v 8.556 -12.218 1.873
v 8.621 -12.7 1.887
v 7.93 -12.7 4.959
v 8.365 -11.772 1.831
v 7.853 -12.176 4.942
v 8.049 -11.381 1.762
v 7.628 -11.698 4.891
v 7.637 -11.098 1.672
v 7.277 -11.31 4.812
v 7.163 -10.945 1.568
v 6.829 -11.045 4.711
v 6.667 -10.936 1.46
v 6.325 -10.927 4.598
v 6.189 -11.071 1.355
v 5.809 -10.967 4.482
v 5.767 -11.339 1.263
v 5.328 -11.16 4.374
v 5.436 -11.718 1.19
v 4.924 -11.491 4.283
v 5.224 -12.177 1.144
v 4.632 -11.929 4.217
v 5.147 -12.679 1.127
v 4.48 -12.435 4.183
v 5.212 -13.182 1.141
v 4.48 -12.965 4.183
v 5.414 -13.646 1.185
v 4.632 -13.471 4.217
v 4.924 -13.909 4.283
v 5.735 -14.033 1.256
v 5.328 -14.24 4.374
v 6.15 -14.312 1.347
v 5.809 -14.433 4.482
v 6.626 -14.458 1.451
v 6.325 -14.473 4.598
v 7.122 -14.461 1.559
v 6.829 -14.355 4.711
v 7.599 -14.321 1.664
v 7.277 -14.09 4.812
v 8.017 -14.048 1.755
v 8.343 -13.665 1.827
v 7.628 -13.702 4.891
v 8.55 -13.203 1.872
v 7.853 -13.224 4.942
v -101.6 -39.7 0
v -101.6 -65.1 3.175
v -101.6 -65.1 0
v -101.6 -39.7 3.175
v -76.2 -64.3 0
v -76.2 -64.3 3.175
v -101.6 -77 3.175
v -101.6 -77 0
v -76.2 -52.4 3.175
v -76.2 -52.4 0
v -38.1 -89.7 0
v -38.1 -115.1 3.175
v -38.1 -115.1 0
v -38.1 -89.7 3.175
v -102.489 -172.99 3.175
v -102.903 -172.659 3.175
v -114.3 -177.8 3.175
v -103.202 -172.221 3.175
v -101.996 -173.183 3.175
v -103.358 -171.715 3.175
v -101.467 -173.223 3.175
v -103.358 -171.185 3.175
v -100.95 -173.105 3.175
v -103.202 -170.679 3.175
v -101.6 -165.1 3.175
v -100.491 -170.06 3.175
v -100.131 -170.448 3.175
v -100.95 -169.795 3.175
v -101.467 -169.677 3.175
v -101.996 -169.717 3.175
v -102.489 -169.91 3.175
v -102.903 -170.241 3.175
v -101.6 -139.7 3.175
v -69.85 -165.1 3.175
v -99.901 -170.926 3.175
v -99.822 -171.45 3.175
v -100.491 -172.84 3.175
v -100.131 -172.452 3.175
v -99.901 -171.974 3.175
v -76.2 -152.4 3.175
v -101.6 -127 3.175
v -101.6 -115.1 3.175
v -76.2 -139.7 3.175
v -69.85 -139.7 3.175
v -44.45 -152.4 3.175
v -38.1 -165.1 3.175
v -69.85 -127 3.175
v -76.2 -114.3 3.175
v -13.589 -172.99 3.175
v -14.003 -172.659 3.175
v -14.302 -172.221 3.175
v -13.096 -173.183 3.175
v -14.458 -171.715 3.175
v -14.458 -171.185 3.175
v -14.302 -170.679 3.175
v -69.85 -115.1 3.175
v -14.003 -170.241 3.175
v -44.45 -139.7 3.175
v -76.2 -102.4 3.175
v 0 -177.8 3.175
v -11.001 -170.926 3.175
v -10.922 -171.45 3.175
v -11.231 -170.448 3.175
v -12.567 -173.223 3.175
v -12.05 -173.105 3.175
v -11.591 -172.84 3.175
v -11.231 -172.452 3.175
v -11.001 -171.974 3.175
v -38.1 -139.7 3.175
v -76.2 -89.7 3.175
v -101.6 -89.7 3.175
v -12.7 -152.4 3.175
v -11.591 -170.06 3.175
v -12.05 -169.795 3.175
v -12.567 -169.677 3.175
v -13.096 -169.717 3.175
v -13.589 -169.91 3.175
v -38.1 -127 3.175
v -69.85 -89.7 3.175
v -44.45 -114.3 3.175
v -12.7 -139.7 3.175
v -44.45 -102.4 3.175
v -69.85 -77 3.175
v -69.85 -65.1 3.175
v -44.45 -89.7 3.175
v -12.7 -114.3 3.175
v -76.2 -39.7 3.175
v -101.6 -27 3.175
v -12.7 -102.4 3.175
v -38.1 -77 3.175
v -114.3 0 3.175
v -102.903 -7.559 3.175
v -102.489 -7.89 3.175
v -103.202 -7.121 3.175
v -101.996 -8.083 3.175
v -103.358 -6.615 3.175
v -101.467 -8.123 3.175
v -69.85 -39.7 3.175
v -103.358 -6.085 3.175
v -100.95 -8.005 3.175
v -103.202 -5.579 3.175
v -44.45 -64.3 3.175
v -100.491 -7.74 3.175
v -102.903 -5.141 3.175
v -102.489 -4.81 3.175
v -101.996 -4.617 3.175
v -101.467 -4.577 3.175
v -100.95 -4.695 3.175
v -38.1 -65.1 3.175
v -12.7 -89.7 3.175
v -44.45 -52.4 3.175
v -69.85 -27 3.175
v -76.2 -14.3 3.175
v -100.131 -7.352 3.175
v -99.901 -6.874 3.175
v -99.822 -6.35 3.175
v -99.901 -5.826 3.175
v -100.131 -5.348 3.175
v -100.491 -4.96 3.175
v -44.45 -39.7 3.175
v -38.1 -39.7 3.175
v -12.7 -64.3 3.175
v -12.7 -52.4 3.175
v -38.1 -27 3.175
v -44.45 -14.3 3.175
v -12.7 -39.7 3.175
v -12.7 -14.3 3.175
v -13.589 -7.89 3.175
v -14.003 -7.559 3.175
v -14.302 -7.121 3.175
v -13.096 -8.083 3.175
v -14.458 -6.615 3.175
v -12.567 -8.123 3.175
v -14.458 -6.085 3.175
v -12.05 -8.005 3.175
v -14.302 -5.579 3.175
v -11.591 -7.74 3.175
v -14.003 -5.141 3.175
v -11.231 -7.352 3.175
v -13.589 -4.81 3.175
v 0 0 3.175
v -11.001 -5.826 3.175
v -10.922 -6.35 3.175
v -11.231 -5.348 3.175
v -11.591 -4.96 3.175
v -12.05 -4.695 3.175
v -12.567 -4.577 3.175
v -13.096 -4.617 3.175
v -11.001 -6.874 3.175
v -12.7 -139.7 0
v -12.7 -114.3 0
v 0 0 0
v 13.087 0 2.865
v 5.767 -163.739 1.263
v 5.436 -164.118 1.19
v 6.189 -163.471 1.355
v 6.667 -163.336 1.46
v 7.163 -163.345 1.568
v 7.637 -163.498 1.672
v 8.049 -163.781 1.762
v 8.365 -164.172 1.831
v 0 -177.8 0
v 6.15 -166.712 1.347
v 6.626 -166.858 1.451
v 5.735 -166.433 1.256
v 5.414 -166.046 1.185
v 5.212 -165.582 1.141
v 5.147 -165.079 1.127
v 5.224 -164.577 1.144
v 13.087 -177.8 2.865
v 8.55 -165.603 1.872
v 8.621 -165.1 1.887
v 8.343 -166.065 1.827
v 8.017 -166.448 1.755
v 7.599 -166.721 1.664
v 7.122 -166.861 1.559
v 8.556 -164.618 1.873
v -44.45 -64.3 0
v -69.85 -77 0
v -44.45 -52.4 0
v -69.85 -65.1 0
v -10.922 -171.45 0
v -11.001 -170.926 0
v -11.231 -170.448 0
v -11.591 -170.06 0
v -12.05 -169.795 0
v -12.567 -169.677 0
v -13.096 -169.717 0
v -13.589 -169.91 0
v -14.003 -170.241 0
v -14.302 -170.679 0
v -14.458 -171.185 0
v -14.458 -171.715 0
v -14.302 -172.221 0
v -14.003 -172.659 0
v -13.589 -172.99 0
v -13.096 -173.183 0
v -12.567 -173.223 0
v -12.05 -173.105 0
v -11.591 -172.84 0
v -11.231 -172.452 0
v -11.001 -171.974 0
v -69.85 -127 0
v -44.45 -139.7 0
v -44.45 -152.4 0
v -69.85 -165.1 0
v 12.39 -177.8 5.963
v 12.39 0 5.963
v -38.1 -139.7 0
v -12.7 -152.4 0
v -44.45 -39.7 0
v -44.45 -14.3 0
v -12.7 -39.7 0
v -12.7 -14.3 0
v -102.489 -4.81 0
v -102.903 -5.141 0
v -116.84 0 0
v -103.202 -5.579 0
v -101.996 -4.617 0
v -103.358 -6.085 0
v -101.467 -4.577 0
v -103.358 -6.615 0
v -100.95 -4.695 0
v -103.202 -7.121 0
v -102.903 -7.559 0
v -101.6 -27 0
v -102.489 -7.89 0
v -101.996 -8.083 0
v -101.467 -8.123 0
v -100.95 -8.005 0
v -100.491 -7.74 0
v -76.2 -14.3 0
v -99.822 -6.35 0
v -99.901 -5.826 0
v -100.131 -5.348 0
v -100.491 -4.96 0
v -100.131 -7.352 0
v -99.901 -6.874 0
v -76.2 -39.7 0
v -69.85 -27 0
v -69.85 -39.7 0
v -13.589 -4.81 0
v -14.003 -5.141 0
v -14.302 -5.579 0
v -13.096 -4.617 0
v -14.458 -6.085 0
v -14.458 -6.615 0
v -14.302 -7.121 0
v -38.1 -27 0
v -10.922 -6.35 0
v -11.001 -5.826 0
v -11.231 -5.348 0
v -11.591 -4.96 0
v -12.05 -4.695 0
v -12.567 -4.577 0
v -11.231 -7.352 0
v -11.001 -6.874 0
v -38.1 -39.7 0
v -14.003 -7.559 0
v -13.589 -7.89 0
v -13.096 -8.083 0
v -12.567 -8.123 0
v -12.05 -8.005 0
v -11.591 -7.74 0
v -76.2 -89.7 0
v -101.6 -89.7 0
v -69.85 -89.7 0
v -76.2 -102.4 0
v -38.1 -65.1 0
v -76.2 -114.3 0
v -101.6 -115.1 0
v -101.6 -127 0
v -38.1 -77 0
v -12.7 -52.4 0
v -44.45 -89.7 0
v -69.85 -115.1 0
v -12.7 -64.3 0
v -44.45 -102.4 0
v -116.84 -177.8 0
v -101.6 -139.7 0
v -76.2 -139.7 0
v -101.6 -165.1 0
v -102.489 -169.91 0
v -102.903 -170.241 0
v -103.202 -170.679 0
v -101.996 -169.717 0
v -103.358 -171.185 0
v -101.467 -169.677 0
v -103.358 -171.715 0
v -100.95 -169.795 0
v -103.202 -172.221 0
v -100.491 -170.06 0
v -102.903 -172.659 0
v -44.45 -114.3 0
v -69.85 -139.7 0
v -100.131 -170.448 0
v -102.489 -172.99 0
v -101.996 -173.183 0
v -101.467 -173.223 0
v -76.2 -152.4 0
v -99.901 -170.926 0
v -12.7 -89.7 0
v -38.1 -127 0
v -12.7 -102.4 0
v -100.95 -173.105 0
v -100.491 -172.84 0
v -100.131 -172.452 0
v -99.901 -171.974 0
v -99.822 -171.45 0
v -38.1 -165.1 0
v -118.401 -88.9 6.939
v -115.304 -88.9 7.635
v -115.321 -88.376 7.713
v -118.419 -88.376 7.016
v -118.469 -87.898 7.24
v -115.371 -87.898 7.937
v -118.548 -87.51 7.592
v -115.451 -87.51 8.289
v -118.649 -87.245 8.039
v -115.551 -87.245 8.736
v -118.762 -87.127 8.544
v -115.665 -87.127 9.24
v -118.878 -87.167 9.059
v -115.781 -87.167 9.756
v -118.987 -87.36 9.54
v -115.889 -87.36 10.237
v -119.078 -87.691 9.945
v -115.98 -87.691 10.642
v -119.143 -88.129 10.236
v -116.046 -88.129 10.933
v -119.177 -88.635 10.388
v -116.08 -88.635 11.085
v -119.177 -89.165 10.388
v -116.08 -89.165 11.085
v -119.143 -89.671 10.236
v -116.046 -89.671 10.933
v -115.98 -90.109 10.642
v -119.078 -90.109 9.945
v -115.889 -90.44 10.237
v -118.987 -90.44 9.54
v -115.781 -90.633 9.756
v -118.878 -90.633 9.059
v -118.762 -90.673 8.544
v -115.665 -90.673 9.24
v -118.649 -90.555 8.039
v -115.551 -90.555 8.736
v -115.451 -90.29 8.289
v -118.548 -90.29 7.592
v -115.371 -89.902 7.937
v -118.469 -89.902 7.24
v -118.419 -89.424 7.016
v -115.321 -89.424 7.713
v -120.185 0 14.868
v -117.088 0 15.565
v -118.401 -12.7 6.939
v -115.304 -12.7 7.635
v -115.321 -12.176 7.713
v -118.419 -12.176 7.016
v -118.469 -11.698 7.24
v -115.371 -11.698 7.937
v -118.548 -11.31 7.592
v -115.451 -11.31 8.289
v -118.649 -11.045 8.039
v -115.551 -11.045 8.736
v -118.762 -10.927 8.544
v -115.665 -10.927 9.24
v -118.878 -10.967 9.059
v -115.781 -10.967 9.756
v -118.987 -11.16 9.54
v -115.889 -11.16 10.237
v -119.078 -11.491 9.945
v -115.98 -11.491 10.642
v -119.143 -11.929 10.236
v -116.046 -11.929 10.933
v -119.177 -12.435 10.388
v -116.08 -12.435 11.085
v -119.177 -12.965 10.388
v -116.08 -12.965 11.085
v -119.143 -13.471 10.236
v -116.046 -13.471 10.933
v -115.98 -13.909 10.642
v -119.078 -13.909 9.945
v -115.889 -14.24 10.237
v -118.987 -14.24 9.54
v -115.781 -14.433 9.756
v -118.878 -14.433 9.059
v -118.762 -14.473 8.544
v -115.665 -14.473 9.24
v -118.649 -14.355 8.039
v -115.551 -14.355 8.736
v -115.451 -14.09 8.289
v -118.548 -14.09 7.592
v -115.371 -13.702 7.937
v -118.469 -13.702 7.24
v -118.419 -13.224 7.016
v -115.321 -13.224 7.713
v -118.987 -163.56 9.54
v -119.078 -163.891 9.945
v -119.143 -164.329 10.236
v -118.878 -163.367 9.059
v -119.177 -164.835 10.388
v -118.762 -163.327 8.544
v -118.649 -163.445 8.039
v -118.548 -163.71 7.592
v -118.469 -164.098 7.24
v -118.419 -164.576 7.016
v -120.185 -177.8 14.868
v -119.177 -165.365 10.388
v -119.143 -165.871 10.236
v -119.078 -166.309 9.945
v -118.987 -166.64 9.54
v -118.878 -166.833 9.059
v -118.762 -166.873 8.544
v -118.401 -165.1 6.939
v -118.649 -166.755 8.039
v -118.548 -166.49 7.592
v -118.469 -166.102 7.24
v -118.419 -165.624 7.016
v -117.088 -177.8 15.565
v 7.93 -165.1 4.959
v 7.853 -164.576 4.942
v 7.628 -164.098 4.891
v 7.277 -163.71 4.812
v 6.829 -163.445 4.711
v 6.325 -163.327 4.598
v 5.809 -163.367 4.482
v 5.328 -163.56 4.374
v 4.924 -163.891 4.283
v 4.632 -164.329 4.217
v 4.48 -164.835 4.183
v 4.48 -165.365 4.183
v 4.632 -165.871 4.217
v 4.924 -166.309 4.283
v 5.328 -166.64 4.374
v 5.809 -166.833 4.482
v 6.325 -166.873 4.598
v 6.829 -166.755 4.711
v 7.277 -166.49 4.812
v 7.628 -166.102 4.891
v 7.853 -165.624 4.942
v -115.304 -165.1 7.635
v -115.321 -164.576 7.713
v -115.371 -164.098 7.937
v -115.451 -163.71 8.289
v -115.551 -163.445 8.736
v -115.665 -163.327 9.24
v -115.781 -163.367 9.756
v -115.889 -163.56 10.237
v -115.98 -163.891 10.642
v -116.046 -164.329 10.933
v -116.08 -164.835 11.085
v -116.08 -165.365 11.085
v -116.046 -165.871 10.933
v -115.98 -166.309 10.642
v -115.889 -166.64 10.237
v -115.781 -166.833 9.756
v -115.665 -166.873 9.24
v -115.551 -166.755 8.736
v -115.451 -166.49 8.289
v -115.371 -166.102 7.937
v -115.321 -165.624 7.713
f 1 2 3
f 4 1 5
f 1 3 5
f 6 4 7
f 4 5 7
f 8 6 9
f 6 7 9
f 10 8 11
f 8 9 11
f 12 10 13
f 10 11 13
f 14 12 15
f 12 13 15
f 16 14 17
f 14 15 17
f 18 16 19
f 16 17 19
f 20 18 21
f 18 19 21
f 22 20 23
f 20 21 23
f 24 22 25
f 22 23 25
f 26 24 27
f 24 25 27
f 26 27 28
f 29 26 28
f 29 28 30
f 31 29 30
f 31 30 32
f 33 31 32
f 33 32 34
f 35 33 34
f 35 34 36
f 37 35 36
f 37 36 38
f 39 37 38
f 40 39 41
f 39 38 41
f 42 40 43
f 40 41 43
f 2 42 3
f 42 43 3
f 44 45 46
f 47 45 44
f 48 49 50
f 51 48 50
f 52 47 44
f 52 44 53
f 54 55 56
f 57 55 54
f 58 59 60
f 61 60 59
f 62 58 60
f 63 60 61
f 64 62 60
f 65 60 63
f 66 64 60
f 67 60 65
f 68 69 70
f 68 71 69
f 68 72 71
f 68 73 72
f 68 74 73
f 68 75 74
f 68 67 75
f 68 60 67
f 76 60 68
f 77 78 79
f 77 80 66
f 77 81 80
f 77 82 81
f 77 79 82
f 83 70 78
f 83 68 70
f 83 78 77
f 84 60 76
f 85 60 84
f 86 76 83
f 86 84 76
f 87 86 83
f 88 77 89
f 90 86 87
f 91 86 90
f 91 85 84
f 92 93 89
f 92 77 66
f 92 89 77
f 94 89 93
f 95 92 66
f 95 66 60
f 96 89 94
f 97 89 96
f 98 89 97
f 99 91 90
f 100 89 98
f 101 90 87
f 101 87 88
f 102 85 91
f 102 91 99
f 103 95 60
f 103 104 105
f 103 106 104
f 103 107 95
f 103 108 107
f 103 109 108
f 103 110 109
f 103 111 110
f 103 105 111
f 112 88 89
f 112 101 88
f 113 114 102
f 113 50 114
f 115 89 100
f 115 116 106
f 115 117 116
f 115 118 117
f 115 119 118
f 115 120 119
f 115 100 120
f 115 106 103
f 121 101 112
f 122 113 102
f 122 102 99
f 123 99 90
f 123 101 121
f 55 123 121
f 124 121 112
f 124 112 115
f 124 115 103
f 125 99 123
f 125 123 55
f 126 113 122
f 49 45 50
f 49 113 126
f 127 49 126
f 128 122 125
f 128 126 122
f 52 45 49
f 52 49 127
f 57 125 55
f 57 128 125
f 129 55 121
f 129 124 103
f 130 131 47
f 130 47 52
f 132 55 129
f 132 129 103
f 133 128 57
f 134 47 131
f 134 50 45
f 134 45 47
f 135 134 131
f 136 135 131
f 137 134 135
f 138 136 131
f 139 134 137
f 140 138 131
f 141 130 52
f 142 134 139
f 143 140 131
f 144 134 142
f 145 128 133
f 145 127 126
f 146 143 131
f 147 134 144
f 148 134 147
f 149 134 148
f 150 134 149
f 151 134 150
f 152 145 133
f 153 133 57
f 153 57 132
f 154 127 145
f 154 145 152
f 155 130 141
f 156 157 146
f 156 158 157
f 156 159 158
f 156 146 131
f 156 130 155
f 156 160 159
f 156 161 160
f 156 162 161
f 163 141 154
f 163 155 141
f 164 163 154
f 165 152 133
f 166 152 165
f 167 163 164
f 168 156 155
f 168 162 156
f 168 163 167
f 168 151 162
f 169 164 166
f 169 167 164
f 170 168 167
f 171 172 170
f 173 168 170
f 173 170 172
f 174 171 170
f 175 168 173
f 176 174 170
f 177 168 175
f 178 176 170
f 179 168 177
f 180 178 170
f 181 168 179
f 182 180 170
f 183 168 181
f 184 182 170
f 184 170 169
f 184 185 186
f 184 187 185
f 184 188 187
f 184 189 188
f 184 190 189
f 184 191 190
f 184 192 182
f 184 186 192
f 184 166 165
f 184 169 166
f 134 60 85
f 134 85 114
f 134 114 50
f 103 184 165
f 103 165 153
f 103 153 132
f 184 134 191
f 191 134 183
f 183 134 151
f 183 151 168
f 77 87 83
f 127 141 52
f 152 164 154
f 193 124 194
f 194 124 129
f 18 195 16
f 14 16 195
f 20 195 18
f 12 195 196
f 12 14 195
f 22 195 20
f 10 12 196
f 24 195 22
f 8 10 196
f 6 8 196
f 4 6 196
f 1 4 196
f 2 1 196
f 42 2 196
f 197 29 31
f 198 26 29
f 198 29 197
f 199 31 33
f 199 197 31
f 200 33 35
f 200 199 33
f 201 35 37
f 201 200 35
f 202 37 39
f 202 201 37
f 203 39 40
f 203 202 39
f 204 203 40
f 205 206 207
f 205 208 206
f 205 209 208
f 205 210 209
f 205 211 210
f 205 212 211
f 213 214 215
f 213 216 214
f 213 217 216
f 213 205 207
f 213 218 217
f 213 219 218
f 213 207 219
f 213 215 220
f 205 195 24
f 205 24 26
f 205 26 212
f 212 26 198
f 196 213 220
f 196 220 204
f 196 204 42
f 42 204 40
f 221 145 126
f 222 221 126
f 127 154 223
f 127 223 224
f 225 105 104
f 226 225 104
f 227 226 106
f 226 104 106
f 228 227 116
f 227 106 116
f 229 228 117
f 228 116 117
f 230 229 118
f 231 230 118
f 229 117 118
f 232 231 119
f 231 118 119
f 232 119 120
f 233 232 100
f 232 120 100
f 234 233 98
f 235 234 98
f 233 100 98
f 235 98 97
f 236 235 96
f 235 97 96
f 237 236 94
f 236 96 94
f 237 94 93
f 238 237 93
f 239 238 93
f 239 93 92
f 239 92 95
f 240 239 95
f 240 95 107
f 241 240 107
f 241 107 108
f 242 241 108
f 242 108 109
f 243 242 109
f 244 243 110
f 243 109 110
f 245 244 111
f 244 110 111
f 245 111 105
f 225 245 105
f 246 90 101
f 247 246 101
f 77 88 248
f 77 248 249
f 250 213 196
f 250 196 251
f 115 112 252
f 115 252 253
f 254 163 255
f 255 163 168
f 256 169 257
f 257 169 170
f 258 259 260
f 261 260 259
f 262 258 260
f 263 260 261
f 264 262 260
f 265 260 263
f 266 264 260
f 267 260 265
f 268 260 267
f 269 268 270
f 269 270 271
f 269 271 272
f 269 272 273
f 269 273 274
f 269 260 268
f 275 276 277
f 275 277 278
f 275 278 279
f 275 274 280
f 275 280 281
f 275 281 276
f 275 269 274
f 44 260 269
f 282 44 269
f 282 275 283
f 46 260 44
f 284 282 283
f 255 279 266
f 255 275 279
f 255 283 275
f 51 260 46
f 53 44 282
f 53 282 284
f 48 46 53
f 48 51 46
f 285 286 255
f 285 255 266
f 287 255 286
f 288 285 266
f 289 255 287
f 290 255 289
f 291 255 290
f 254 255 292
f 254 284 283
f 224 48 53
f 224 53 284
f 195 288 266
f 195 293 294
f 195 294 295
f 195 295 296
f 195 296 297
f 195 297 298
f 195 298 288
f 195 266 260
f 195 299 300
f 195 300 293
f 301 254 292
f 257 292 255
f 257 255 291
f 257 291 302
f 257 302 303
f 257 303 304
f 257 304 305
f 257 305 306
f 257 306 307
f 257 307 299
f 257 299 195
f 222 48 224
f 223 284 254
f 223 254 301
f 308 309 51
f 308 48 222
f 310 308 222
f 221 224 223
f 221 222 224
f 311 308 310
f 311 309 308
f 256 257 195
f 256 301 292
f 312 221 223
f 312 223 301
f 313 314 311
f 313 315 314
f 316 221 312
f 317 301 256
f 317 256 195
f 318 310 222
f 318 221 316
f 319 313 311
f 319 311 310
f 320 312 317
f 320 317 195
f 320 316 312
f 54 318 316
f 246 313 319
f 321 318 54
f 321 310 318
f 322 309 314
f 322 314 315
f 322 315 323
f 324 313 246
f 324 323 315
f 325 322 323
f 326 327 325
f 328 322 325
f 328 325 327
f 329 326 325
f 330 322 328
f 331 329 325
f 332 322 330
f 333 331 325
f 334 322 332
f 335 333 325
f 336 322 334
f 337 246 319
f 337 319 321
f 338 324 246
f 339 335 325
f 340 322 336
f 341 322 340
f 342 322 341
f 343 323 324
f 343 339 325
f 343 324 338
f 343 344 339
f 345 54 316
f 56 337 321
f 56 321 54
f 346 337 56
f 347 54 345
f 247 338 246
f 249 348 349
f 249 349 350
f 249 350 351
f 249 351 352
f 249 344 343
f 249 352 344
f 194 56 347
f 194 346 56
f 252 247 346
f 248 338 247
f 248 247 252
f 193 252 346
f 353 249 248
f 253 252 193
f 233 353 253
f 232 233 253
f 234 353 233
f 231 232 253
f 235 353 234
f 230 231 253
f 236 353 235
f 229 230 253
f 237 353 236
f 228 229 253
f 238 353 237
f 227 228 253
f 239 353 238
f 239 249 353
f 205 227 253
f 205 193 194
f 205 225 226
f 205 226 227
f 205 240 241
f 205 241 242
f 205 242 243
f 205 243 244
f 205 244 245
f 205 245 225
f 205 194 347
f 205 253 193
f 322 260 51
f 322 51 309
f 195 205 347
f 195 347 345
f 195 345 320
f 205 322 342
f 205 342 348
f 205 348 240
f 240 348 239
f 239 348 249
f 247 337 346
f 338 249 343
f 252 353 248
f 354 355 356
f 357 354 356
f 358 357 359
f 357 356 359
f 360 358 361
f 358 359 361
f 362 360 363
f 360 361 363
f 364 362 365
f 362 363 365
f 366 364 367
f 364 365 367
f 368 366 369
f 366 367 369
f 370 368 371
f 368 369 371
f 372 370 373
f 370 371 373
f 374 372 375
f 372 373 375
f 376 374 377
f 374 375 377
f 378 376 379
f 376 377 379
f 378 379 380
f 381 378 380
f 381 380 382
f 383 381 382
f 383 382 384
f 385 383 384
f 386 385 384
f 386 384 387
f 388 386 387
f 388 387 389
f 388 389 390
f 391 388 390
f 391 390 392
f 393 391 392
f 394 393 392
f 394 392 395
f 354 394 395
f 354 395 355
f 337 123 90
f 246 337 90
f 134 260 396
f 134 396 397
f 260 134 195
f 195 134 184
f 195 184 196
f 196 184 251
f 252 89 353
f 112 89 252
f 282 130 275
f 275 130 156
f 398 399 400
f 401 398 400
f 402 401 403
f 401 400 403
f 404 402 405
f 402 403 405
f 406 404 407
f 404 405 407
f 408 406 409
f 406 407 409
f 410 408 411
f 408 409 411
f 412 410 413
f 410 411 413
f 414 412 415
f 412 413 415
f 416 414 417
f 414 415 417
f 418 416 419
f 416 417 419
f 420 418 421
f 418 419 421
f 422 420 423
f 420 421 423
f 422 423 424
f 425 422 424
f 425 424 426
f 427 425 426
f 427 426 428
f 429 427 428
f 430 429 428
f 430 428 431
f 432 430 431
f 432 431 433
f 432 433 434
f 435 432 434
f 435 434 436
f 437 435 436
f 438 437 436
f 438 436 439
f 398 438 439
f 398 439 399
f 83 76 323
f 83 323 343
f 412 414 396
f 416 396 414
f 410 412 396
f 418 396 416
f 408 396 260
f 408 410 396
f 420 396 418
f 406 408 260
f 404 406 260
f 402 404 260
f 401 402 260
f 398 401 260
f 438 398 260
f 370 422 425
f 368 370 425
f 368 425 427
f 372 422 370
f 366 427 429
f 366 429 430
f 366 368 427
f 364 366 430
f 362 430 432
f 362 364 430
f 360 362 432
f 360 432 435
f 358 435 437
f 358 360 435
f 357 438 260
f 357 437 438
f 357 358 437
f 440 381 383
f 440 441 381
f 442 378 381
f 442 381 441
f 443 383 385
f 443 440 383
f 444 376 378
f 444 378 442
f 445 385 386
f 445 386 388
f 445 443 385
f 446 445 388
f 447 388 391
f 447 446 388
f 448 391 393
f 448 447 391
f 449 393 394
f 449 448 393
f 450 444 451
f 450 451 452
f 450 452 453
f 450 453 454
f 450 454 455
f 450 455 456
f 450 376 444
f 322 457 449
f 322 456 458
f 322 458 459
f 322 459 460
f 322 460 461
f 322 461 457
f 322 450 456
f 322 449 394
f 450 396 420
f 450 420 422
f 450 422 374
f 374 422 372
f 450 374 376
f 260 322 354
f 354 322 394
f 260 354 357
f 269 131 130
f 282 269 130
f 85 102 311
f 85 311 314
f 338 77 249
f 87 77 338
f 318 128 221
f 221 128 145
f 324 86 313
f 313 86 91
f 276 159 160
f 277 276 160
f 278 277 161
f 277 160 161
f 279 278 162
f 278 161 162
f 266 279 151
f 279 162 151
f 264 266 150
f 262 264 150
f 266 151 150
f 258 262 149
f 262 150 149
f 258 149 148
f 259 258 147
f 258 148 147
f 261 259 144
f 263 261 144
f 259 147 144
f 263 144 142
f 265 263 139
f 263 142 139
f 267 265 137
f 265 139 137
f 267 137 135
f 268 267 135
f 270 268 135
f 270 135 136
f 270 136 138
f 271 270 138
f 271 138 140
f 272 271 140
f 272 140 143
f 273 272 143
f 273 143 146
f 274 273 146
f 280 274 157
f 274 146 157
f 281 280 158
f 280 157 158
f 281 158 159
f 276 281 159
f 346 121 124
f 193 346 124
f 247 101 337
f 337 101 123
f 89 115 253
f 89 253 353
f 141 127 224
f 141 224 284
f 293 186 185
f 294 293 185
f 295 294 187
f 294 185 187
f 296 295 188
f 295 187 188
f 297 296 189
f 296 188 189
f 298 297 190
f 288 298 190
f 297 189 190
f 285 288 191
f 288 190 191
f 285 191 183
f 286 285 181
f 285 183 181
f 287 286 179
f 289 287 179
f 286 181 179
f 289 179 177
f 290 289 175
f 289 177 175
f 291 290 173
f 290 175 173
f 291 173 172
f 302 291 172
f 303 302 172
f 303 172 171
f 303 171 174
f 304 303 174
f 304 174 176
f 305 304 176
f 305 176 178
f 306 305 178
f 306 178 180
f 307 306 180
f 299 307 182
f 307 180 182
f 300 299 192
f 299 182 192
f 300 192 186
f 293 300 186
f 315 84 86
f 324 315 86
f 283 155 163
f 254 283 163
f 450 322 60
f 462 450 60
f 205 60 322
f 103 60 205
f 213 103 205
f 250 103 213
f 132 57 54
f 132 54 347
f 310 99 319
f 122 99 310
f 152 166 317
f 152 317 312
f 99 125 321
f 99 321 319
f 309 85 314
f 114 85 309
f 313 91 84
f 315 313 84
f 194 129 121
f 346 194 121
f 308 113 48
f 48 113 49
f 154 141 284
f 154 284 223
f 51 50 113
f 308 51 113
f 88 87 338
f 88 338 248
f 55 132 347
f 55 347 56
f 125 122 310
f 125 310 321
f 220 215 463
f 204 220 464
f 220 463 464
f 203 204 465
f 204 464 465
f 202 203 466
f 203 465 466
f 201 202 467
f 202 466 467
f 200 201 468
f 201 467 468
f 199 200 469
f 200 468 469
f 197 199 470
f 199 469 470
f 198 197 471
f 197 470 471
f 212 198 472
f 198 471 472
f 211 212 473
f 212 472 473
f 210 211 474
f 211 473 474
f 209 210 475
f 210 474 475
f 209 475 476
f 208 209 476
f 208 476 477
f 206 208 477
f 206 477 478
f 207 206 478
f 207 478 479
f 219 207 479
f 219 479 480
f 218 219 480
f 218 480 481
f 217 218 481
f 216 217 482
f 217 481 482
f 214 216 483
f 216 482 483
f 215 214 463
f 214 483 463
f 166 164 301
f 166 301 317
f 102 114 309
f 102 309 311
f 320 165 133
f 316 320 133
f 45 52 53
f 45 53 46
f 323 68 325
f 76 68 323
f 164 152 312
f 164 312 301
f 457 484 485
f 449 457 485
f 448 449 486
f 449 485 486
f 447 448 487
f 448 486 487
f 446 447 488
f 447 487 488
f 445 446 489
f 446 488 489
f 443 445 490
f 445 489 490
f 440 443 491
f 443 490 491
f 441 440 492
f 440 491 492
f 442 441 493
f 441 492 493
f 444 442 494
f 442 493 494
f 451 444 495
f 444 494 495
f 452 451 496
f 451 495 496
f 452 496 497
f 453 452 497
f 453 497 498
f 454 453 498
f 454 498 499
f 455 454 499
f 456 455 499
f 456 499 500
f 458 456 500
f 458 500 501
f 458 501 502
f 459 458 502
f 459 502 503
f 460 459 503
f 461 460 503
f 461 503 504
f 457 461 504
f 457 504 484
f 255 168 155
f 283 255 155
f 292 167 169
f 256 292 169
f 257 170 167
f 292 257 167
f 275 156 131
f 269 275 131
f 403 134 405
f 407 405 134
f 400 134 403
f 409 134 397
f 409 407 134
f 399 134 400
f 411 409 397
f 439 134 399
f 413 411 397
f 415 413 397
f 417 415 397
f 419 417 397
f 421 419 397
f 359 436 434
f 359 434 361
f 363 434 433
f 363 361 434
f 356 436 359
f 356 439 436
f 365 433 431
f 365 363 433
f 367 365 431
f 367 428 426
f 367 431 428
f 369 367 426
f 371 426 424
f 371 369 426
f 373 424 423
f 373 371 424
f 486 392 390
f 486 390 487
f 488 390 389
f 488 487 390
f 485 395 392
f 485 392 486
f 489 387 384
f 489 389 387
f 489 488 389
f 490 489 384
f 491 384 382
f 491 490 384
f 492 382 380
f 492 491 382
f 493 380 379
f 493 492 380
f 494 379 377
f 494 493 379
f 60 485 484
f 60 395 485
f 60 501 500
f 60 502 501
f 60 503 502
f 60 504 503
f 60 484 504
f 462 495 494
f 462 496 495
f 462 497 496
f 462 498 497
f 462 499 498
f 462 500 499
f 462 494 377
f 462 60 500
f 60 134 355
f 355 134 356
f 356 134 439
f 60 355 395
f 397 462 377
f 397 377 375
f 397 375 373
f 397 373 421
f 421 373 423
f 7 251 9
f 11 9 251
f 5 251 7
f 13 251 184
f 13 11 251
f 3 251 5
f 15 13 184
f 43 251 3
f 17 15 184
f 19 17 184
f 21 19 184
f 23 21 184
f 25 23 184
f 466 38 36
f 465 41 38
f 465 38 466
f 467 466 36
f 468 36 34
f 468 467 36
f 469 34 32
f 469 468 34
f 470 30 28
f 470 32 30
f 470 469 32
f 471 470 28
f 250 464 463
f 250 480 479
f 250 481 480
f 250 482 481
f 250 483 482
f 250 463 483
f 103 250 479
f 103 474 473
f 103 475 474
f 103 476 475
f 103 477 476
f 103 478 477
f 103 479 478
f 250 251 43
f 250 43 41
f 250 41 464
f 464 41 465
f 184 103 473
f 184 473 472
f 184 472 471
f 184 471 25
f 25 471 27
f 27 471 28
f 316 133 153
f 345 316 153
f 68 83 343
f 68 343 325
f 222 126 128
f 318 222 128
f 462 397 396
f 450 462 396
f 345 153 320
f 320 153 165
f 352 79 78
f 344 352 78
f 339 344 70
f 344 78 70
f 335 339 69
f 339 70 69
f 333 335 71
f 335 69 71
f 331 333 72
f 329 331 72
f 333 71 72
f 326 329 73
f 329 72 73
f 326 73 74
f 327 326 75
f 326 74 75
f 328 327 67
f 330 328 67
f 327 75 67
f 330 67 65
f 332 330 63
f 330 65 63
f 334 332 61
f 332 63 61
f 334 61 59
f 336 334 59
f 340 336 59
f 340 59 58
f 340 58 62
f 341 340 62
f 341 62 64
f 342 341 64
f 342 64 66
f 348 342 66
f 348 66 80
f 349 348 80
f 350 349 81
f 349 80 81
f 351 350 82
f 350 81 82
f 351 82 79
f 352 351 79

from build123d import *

# Parameters (mm, degrees)
SKETCH1_W              = 114.3
SKETCH1_H              = 177.8
BOSS_EXTRUDE1_DEPTH    = 3.175
BOSS_EXTRUDE2_DEPTH    = 177.8
SKETCH3_R              = 1.778
CUT_EXTRUDE1_DEPTH     = 203.2
CUT_EXTRUDE2_DEPTH     = 3.175
LPATTERN2_COUNT        = 3
LPATTERN2_PITCH        = 50
LPATTERN3_COUNT        = 3
LPATTERN3_PITCH        = 31.75
LPATTERN3_COPY_1_DEPTH = 3.175
LPATTERN3_COPY_2_DEPTH = 3.175
LPATTERN3_COPY_3_DEPTH = 3.175
LPATTERN3_COPY_4_DEPTH = 3.175
SKETCH5_R              = 1.778
CUT_EXTRUDE3_DEPTH     = 3.175
SKETCH6_R              = 1.778
CUT_EXTRUDE4_DEPTH     = 3.175


with BuildPart() as part:
    # Sketch1 → Boss-Extrude1 (new body)
    with BuildSketch(Plane.XY):
        with Locations((-57.15, -88.9)):
            Rectangle(SKETCH1_W, SKETCH1_H)
    extrude(amount=BOSS_EXTRUDE1_DEPTH)

    # Sketch2 → Boss-Extrude2 (add)
    with BuildSketch(Plane.XZ.offset(177.8)):
        Polygon((-114.3, 3.175), (-117.087804878, 15.565243902), (-120.185365854, 14.868292683), (-116.84, 0), (-114.3, 0), align=None)
        Polygon((0, 3.175), (0, 0), (13.087195122, 2.865243902), (12.390243902, 5.962804878), align=None)
    extrude(amount=-BOSS_EXTRUDE2_DEPTH)

    # Sketch3 → Cut-Extrude1 (cut)
    with BuildSketch(Plane(origin=(-108.112433076, 0, -24.325297442), x_dir=(0.219512195, 0, -0.975609756), z_dir=(0.975609756, 0, 0.219512195))):
        with Locations((-34.537804878, -165.1)):
            Circle(SKETCH3_R)
        with Locations((-34.537804878, -88.9)):
            Circle(SKETCH3_R)
        with Locations((-34.537804878, -12.7)):
            Circle(SKETCH3_R)
    extrude(amount=-CUT_EXTRUDE1_DEPTH, mode=Mode.SUBTRACT)

    # Sketch4 → Cut-Extrude2 (cut)
    with BuildSketch(Plane.XY.offset(3.175)):
        Polygon((-101.6, -165.1), (-101.6, -139.7), (-76.2, -152.4), align=None)
        Polygon((-101.6, -127), (-76.2, -139.7), (-76.2, -114.3), align=None)
    cut_extrude2 = extrude(amount=-CUT_EXTRUDE2_DEPTH, mode=Mode.SUBTRACT)

    # LPattern2: Cut-Extrude2 ×3
    with Locations(*[(0, i * LPATTERN2_PITCH, 0) for i in range(1, LPATTERN2_COUNT)]):
        add(cut_extrude2, mode=Mode.SUBTRACT)

    # LPattern3: Cut-Extrude2 ×3
    with Locations(*[(i * LPATTERN3_PITCH, 0, 0) for i in range(1, LPATTERN3_COUNT)]):
        add(cut_extrude2, mode=Mode.SUBTRACT)

    # LPattern3 copy 1 sketch → LPattern3 copy 1 (cut)
    with BuildSketch(Plane(origin=(31.75, 50, 3.175), x_dir=(1, 0, 0), z_dir=(0, 0, 1))):
        Polygon((-101.6, -165.1), (-101.6, -139.7), (-76.2, -152.4), align=None)
        Polygon((-101.6, -127), (-76.2, -139.7), (-76.2, -114.3), align=None)
    extrude(amount=-LPATTERN3_COPY_1_DEPTH, mode=Mode.SUBTRACT)

    # LPattern3 copy 2 sketch → LPattern3 copy 2 (cut)
    with BuildSketch(Plane(origin=(63.5, 50, 3.175), x_dir=(1, 0, 0), z_dir=(0, 0, 1))):
        Polygon((-101.6, -165.1), (-101.6, -139.7), (-76.2, -152.4), align=None)
        Polygon((-101.6, -127), (-76.2, -139.7), (-76.2, -114.3), align=None)
    extrude(amount=-LPATTERN3_COPY_2_DEPTH, mode=Mode.SUBTRACT)

    # LPattern3 copy 3 sketch → LPattern3 copy 3 (cut)
    with BuildSketch(Plane(origin=(31.75, 100, 3.175), x_dir=(1, 0, 0), z_dir=(0, 0, 1))):
        Polygon((-101.6, -165.1), (-101.6, -139.7), (-76.2, -152.4), align=None)
        Polygon((-101.6, -127), (-76.2, -139.7), (-76.2, -114.3), align=None)
    extrude(amount=-LPATTERN3_COPY_3_DEPTH, mode=Mode.SUBTRACT)

    # LPattern3 copy 4 sketch → LPattern3 copy 4 (cut)
    with BuildSketch(Plane(origin=(63.5, 100, 3.175), x_dir=(1, 0, 0), z_dir=(0, 0, 1))):
        Polygon((-101.6, -165.1), (-101.6, -139.7), (-76.2, -152.4), align=None)
        Polygon((-101.6, -127), (-76.2, -139.7), (-76.2, -114.3), align=None)
    extrude(amount=-LPATTERN3_COPY_4_DEPTH, mode=Mode.SUBTRACT)

    # Sketch5 → Cut-Extrude3 (cut)
    with BuildSketch(Plane.XY.offset(3.175)):
        with Locations((-101.6, -171.45)):
            Circle(SKETCH5_R)
        with Locations((-12.7, -171.45)):
            Circle(SKETCH5_R)
        with Locations((-12.7, -6.35)):
            Circle(SKETCH5_R)
        with Locations((-101.6, -6.35)):
            Circle(SKETCH5_R)
    extrude(amount=-CUT_EXTRUDE3_DEPTH, mode=Mode.SUBTRACT)

    # Sketch6 → Cut-Extrude4 (cut)
    with BuildSketch(Plane(origin=(-0.679952409, 0, 3.022010708), x_dir=(0.975609756, 0, 0.219512195), z_dir=(-0.219512195, 0, 0.975609756))):
        with Locations((7.04695122, -165.1)):
            Circle(SKETCH6_R)
        with Locations((7.04695122, -12.7)):
            Circle(SKETCH6_R)
    extrude(amount=-CUT_EXTRUDE4_DEPTH, mode=Mode.SUBTRACT)


solid = part.part
